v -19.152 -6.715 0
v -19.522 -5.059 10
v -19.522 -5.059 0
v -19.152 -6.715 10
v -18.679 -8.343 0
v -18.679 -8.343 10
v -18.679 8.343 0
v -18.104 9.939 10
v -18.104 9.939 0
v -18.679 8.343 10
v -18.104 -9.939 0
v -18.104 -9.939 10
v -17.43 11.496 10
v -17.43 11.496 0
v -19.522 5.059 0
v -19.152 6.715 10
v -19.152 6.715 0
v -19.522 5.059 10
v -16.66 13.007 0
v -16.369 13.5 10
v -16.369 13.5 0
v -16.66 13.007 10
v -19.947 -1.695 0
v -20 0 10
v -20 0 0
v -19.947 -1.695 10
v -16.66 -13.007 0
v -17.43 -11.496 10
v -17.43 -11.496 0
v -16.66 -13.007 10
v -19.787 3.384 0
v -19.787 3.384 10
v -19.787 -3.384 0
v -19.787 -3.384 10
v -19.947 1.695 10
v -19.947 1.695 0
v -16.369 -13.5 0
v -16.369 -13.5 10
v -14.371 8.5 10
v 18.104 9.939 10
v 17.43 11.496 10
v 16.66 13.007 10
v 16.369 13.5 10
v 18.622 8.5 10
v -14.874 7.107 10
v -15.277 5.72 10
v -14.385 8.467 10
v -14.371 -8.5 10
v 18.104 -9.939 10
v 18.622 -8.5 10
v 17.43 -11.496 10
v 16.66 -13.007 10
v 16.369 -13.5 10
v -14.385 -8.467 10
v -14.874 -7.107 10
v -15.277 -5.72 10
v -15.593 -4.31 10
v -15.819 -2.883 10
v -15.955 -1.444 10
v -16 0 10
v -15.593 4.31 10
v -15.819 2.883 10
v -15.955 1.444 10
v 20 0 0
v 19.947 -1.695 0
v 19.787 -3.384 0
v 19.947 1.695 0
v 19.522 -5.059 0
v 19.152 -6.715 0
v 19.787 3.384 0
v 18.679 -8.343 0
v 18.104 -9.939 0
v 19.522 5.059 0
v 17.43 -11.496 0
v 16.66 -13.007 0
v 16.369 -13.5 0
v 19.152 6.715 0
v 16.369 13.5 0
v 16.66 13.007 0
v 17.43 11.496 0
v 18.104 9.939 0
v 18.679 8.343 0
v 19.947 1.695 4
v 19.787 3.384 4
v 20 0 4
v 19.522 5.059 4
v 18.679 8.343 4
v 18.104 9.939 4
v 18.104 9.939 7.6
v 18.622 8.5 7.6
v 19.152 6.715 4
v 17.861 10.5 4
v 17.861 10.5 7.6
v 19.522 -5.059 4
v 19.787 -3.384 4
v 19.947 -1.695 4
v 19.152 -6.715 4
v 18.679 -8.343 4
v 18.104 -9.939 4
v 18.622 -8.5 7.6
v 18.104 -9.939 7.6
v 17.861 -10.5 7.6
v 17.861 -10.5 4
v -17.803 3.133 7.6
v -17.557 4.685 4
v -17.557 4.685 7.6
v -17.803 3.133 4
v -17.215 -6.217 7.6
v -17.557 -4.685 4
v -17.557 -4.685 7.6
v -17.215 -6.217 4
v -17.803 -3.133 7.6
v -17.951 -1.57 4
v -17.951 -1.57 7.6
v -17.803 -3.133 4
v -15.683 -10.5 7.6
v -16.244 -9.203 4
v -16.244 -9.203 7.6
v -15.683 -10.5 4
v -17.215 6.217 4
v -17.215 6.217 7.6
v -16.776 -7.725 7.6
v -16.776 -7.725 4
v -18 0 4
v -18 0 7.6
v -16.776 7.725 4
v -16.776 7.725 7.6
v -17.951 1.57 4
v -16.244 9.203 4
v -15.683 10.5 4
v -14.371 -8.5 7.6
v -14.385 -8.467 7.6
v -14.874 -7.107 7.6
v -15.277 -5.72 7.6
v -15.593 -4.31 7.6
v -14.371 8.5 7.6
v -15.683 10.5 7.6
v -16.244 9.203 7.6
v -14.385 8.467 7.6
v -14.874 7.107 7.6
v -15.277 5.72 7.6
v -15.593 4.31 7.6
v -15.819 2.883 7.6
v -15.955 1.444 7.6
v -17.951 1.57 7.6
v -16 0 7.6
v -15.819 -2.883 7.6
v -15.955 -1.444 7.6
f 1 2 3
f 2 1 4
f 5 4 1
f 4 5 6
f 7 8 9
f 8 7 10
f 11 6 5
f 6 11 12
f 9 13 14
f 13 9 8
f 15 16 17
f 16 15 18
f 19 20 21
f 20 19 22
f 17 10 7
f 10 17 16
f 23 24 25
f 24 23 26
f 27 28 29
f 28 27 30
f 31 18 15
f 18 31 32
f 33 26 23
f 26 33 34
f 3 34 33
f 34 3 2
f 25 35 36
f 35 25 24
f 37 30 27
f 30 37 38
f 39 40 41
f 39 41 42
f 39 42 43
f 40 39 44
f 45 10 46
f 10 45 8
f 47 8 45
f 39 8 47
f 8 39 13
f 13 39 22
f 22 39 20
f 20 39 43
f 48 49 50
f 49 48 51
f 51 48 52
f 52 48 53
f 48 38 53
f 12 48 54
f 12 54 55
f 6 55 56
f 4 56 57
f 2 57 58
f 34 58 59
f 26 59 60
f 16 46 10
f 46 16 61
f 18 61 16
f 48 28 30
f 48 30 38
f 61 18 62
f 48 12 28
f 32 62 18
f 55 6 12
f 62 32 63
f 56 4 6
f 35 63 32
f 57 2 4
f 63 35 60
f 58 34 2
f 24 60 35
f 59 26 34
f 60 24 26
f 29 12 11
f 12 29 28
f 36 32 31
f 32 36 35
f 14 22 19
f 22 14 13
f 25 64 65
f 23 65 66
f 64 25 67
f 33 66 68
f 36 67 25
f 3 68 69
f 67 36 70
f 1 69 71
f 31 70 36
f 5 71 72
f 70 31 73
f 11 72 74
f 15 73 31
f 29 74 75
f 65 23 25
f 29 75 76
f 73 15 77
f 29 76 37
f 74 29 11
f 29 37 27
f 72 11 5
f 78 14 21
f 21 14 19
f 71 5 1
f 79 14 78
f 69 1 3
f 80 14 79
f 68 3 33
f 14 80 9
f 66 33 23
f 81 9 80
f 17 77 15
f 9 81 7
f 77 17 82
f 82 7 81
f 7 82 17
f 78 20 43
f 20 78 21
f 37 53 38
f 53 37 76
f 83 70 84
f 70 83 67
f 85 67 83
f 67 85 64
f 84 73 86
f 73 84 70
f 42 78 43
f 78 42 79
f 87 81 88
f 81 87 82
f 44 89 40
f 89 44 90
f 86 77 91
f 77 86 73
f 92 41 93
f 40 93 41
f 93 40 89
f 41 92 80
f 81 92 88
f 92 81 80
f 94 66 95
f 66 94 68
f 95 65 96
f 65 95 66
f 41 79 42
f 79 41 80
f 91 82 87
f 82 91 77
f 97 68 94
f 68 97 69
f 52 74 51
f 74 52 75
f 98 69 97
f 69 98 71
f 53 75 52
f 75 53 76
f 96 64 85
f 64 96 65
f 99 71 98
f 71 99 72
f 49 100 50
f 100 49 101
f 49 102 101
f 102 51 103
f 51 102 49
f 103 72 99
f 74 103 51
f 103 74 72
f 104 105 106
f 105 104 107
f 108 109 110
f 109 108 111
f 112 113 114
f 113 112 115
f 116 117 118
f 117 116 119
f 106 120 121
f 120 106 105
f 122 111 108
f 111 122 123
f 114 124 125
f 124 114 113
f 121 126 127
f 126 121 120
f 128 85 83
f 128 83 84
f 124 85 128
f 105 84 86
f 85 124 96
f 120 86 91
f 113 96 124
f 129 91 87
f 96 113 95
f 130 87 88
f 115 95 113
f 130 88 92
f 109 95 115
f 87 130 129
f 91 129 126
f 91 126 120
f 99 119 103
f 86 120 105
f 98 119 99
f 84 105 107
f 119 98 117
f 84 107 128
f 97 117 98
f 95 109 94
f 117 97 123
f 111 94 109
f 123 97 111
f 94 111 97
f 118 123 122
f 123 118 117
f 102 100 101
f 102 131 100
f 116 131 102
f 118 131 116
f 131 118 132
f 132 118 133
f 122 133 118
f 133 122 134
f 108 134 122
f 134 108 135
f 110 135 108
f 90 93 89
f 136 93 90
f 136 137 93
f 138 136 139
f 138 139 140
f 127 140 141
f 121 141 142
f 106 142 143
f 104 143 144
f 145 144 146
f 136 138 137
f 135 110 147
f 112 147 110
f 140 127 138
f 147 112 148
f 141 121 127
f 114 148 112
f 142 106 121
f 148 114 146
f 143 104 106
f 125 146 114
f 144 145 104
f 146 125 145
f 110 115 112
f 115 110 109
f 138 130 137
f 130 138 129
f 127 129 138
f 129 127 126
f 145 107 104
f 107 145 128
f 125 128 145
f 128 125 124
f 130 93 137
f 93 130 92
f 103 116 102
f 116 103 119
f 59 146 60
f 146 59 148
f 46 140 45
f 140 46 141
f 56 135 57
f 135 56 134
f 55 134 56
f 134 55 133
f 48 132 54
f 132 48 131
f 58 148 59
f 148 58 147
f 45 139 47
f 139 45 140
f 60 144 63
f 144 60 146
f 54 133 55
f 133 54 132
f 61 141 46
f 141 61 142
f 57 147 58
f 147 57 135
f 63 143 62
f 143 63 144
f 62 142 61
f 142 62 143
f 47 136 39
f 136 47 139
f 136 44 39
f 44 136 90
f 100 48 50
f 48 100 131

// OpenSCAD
$fn = 100;

cylinderOffset = 7;
totalWidth = 27;

totalHeight = 10;
baseThickness = 4;

wallThickness = 3;
footHeight = 3.6;
topWallThickness = 5;
y = totalWidth;

difference(){
  intersection(){
    intersection(){
      translate([cylinderOffset,0,0])
        cylinder(r=totalWidth, h=totalHeight);
      translate([-y,-(totalWidth/2),0])
        cube([y*2,totalWidth,totalHeight]);
      }
    intersection(){
      translate([-cylinderOffset,0,0])
        cylinder(r=y, h=totalHeight);
      translate([-y,-(totalWidth/2),0])
        cube([y*2,totalWidth,totalHeight]);
      }
    }
  union(){
    intersection(){
      translate([cylinderOffset,0,baseThickness])
        cylinder(r=totalWidth-wallThickness+1, h=footHeight);
      translate([-y,-((totalWidth-(wallThickness*2))/2),baseThickness])
        cube([y*2,totalWidth-(wallThickness*2),footHeight]);
      }
    intersection(){
      translate([cylinderOffset,0,baseThickness+(footHeight/2)])
        cylinder(r=totalWidth-topWallThickness+1, h=totalHeight);
      translate([-y,-((totalWidth-(topWallThickness*2))/2),baseThickness+(footHeight/2)])
        cube([y*2,totalWidth-(topWallThickness*2),totalHeight]);
      }
    }
  }
